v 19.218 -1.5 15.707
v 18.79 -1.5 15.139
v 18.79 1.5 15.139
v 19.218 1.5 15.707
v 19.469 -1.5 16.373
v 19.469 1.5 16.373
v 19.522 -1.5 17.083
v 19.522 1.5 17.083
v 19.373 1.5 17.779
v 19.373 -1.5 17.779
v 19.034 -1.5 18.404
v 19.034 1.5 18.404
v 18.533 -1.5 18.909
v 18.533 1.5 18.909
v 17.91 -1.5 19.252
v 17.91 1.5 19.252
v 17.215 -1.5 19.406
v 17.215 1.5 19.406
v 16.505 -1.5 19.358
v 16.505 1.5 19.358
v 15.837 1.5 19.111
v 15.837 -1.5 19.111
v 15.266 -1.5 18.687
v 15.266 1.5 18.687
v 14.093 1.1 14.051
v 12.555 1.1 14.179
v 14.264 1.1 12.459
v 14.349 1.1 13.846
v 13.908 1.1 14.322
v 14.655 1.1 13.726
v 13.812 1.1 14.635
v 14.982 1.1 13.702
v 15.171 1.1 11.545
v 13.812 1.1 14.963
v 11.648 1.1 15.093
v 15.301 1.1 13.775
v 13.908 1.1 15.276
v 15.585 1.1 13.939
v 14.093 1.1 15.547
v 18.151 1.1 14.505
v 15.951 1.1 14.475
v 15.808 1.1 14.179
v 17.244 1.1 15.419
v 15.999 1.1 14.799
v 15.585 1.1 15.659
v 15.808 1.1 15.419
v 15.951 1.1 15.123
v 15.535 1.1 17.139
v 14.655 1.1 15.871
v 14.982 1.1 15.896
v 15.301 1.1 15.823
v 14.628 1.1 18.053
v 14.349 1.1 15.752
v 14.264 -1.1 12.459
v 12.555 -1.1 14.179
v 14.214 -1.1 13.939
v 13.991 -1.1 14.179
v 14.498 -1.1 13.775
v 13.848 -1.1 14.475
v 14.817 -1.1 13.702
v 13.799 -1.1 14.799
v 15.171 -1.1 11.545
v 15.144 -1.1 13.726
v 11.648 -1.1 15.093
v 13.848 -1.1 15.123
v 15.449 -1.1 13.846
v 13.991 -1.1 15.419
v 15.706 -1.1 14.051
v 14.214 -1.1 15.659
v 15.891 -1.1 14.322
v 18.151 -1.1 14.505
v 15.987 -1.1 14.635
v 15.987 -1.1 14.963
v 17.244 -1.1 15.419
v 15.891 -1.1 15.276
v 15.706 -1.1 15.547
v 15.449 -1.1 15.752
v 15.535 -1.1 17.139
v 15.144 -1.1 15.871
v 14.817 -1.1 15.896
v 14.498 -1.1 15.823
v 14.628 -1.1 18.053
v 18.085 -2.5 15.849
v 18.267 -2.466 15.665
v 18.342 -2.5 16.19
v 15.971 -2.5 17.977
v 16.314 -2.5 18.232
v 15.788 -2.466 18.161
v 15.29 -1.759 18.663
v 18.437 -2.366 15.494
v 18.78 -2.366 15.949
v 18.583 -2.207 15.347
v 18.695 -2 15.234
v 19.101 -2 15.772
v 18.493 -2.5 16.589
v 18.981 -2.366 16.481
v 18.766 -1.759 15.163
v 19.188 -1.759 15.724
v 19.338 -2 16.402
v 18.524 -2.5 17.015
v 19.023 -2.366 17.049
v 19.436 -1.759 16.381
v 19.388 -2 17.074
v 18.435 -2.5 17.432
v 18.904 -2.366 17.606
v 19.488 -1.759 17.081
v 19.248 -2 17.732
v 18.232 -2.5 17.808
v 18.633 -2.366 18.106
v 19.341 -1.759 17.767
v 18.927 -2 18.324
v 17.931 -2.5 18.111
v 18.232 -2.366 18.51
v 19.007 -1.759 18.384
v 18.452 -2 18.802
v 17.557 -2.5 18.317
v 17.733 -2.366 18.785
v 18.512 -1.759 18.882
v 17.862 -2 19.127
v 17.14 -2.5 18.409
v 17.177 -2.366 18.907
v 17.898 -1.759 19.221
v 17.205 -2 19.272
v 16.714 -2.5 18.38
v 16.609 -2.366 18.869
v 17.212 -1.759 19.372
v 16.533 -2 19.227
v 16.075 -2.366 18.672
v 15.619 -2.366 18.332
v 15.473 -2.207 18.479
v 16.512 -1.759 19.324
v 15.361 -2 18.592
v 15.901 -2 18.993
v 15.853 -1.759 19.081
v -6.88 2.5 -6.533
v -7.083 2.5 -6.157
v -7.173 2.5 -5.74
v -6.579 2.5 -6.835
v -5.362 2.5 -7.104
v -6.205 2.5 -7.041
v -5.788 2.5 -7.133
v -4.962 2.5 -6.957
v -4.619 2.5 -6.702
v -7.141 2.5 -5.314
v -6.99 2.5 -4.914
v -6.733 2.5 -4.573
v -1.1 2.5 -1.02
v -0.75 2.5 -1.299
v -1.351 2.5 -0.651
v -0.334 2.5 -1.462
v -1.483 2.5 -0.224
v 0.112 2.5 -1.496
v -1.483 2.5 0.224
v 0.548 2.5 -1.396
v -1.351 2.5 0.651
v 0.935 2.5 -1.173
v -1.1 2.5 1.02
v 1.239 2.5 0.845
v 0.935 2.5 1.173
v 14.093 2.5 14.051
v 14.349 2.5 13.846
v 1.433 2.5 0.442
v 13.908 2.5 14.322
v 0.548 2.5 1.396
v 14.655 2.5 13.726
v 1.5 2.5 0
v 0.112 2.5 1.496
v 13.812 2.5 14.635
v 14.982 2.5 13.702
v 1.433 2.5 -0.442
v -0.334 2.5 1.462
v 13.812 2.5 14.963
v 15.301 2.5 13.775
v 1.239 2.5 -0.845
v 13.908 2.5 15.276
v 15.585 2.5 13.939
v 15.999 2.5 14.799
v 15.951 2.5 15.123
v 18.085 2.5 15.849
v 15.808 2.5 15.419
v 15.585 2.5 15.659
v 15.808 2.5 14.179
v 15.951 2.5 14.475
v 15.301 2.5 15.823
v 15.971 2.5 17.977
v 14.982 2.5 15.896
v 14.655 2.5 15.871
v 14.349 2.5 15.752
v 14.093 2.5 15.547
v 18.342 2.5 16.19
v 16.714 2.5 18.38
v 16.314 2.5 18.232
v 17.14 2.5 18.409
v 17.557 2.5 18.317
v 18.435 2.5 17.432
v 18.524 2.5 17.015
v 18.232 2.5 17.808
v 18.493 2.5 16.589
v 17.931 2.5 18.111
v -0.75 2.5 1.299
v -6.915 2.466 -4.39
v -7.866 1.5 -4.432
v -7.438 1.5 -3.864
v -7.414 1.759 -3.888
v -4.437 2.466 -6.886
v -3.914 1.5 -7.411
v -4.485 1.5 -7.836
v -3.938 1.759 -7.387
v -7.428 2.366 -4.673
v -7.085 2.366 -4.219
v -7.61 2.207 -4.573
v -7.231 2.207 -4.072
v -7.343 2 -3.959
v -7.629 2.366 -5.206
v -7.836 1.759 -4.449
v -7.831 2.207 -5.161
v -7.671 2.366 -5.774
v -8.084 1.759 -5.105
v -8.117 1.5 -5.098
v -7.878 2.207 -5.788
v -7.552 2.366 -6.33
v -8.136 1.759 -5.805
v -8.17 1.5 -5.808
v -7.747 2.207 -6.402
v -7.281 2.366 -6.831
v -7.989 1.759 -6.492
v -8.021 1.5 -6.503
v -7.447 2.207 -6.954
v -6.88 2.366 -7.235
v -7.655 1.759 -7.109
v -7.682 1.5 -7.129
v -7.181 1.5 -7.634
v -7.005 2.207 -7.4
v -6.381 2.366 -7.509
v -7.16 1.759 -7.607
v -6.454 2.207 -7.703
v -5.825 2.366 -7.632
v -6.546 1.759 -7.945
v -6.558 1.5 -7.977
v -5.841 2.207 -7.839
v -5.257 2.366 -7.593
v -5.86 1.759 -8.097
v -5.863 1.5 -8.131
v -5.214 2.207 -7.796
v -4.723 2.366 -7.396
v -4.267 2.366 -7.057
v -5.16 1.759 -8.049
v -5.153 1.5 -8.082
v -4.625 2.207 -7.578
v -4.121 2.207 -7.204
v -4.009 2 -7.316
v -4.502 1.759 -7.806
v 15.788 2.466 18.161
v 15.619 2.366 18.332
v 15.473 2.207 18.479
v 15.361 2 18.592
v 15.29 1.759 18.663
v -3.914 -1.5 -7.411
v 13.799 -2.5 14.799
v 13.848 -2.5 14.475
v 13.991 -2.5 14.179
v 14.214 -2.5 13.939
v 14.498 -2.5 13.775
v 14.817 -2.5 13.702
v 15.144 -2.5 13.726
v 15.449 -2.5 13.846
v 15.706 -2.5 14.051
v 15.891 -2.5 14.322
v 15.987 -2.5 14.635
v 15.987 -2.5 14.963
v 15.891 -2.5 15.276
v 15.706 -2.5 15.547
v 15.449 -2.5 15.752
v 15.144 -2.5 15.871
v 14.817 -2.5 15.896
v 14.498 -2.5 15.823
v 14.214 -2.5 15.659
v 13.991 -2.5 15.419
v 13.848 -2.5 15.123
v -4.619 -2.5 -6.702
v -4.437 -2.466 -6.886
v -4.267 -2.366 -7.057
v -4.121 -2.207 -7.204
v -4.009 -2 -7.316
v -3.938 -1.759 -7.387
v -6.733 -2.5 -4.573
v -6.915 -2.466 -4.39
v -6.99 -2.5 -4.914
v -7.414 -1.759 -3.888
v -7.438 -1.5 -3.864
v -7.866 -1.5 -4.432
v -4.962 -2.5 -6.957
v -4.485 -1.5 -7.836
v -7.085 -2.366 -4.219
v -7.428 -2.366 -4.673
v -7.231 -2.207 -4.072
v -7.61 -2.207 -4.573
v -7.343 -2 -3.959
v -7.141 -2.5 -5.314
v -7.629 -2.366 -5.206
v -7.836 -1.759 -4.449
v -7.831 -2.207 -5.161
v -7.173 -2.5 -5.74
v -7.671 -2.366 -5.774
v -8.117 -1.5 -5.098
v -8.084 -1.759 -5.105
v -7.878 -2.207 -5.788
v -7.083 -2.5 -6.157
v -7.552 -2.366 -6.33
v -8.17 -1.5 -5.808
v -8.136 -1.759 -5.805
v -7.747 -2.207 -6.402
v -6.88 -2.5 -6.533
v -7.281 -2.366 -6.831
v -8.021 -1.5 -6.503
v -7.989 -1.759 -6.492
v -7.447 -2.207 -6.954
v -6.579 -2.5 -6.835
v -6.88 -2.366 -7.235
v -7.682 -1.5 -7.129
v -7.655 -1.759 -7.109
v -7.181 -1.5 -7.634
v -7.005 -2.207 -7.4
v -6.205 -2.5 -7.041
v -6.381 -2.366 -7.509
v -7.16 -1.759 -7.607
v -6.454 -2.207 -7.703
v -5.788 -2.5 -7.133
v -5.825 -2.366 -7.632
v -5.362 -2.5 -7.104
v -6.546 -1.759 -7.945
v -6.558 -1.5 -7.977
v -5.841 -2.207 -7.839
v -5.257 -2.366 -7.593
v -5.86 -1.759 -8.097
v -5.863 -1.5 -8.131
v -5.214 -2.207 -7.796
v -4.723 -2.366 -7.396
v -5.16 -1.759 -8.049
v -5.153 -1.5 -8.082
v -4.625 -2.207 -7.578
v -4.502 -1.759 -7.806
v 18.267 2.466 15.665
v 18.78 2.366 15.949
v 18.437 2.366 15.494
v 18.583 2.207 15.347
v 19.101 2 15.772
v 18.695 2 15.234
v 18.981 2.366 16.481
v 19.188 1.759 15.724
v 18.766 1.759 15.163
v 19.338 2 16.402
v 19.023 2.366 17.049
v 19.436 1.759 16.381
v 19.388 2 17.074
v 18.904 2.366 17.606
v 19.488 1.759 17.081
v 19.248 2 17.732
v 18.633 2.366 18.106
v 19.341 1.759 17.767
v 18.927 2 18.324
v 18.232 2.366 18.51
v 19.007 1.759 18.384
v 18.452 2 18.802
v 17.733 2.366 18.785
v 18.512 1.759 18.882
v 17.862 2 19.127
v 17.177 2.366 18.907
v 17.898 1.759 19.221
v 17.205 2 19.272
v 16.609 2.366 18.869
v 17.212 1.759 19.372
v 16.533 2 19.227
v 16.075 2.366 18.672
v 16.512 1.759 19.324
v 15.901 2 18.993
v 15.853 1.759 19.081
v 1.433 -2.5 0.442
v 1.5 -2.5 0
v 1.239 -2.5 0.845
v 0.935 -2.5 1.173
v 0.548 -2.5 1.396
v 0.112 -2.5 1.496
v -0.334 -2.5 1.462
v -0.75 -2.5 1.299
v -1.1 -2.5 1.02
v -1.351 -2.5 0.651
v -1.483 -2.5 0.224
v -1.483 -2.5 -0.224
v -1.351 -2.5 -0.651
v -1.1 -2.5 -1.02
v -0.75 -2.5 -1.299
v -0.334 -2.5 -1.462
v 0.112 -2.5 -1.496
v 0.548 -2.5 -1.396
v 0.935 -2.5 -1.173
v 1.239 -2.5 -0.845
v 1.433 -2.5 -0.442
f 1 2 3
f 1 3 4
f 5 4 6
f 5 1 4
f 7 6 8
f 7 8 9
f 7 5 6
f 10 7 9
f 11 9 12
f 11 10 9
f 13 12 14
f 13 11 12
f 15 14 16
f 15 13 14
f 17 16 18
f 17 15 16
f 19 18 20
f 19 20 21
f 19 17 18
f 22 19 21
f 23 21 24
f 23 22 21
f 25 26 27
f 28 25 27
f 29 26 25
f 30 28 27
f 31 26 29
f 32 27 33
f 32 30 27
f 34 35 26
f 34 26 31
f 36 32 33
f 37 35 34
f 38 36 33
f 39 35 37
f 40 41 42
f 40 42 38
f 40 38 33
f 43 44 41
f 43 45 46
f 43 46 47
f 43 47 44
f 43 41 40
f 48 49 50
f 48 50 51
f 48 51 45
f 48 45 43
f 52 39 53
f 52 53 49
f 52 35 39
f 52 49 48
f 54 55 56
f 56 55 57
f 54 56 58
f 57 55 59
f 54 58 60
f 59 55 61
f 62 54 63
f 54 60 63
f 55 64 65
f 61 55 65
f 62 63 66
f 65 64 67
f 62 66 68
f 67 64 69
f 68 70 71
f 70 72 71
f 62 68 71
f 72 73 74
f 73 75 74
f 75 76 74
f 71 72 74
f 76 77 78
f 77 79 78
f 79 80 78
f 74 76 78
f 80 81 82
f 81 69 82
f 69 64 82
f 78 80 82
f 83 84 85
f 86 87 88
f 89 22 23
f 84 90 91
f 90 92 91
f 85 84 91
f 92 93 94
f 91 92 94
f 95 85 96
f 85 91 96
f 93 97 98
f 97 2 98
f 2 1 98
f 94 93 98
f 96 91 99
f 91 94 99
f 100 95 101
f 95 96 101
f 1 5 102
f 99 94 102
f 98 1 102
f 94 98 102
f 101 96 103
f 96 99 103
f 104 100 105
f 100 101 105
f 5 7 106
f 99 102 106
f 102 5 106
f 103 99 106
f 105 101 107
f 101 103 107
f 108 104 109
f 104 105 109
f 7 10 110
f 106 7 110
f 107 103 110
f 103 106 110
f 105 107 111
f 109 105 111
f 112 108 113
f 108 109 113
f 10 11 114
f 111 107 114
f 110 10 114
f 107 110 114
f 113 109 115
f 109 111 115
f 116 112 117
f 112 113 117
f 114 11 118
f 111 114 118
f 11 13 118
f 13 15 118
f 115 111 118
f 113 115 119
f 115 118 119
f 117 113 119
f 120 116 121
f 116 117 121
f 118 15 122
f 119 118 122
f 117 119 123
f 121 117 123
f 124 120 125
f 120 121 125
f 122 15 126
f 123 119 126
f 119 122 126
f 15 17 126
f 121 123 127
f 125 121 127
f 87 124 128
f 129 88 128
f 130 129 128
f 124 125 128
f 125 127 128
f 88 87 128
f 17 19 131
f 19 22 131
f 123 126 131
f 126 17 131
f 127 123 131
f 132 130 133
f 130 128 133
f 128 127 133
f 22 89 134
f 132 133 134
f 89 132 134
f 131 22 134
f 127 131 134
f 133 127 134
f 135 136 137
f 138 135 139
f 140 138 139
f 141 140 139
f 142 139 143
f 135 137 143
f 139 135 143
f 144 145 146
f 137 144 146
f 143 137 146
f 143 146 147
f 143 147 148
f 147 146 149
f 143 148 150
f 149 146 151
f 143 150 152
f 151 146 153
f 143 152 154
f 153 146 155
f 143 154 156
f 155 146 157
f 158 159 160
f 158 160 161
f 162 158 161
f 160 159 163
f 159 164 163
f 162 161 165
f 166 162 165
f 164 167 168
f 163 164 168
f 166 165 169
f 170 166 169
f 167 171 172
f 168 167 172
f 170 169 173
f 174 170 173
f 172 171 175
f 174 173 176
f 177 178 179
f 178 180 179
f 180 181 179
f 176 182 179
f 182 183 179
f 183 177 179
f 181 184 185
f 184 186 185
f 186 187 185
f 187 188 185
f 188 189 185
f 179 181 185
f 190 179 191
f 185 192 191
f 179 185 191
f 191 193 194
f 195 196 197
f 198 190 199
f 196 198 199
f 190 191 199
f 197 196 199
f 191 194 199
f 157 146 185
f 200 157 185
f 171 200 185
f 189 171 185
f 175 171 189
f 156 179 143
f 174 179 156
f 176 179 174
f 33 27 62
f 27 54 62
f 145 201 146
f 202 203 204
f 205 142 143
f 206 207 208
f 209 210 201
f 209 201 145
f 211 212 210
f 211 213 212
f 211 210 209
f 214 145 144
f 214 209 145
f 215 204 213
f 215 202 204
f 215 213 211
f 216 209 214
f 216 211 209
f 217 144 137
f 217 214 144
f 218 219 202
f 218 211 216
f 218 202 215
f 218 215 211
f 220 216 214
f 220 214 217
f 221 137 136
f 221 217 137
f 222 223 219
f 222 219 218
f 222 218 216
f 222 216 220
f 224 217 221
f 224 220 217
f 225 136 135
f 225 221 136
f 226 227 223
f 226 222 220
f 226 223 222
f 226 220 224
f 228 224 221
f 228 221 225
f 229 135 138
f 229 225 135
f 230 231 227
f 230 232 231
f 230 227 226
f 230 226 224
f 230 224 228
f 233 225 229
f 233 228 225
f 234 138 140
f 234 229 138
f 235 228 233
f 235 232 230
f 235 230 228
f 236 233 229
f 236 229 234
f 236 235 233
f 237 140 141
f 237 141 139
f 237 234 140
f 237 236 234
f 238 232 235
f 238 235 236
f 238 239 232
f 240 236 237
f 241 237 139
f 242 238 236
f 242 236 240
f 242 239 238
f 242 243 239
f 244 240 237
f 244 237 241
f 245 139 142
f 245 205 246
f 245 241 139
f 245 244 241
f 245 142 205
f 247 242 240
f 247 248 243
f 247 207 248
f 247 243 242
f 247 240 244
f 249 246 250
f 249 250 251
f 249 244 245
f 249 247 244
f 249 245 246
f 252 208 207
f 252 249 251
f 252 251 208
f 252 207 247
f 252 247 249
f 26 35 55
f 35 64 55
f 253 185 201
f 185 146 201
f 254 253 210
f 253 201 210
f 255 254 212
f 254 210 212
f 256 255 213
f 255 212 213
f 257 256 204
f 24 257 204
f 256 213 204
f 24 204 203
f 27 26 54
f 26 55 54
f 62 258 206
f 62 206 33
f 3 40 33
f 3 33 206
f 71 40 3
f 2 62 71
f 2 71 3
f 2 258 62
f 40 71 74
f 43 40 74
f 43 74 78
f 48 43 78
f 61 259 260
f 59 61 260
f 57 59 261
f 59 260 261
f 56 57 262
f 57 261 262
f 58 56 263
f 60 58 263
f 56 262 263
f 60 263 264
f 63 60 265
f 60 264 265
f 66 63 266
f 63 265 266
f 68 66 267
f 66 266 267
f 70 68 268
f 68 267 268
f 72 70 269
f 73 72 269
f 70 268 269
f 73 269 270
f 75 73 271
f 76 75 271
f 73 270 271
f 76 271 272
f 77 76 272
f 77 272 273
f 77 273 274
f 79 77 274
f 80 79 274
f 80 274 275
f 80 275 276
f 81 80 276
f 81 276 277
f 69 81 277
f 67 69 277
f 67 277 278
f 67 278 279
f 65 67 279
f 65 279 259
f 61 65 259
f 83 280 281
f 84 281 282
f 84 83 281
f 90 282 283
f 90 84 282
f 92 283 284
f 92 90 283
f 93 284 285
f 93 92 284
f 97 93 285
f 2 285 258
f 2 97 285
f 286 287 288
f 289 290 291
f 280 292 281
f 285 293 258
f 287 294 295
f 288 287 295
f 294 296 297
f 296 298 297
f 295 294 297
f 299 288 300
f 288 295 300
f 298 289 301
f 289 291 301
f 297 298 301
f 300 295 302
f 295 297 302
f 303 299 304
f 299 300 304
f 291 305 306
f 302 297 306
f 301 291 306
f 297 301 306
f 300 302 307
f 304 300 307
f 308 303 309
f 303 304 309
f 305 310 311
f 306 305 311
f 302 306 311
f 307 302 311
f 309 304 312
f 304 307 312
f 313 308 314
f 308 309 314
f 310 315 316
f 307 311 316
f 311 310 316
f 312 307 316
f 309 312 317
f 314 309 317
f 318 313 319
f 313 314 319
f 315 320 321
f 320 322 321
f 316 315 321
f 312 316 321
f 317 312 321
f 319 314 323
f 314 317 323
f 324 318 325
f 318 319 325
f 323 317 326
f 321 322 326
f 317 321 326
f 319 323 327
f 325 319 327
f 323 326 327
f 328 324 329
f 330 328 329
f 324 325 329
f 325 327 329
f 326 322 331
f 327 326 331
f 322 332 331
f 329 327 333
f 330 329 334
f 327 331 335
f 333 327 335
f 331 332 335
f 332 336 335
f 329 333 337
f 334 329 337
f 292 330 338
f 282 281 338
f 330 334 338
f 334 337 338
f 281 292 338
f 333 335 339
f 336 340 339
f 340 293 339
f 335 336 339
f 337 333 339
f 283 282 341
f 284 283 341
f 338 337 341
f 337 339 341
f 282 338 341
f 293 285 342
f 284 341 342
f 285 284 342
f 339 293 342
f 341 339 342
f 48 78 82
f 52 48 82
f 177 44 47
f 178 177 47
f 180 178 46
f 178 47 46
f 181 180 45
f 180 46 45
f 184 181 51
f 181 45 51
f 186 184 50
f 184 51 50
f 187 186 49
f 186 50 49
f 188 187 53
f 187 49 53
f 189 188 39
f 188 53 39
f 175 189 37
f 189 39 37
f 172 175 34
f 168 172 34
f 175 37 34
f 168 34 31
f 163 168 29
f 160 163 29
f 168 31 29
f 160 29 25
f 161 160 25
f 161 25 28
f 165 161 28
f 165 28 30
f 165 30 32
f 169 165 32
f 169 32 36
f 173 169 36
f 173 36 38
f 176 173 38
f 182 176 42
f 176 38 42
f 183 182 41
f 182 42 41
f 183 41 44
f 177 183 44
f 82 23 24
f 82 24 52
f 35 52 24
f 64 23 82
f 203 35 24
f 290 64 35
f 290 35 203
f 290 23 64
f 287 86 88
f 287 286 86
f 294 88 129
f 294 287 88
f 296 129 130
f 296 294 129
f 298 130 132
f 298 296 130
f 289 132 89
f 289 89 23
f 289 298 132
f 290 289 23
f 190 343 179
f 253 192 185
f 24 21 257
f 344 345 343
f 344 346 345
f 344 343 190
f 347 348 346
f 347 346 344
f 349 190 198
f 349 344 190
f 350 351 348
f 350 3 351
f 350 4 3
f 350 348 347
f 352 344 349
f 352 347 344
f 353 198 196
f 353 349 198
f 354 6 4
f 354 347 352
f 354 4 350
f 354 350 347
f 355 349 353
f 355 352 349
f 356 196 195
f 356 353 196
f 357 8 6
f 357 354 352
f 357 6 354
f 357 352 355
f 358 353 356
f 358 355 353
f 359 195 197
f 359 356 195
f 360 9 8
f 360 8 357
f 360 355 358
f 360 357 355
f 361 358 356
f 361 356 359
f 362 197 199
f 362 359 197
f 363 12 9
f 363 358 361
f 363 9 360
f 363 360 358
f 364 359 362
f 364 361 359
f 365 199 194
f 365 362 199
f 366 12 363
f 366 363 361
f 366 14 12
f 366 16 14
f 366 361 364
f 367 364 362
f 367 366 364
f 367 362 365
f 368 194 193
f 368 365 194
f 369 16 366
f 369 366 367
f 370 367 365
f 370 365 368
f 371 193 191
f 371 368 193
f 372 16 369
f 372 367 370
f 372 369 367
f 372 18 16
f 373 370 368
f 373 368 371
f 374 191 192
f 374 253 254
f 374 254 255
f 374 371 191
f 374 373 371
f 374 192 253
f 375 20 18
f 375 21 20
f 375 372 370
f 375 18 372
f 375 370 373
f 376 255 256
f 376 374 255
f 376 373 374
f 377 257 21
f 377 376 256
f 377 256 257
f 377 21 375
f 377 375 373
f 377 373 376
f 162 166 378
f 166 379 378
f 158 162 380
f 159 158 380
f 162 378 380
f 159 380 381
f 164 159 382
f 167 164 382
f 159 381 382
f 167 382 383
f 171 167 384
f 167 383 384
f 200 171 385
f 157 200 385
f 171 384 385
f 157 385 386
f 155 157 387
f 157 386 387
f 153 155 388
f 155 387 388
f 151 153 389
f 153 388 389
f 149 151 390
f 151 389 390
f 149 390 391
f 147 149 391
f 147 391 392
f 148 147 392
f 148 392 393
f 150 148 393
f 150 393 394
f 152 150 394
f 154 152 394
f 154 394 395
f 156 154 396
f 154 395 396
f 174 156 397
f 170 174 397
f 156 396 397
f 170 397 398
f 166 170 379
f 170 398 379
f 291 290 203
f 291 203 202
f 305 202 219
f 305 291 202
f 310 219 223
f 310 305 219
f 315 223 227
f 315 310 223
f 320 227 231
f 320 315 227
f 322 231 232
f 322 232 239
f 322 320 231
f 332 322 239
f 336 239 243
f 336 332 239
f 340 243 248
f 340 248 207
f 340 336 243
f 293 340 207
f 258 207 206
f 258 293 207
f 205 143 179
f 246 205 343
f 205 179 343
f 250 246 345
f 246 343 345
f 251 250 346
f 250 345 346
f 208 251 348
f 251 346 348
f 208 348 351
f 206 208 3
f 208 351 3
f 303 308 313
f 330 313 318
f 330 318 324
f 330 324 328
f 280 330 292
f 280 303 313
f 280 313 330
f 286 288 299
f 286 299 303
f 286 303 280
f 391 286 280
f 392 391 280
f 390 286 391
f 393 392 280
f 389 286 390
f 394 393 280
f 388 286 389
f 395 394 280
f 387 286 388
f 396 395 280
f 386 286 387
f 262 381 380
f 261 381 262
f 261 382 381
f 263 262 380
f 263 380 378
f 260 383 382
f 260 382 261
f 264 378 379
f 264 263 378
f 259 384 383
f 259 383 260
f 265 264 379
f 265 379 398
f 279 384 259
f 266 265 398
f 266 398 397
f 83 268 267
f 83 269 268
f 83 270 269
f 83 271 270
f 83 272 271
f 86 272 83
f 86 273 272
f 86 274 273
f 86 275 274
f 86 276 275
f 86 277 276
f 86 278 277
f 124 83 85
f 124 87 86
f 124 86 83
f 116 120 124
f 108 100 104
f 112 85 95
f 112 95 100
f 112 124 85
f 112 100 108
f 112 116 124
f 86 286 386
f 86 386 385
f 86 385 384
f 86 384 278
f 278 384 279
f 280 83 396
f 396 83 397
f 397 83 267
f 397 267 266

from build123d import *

# Parameters (mm, degrees)
F0_R     = 1.5
F1_DEPTH = 2.5
F2_DEPTH = 5
F3_R     = 0.99999
F6_DEPTH = 1.1
F7_D     = 2.2
F7_DEPTH = 2.501
F8_D     = 2.2


# Not quite as in the source:
# - a fillet or chamfer is up to 0.001 mm smaller than in the source, because OpenCascade refuses the exact size


with BuildPart() as f1:
    # F0 (on Front) → F1 (new body, symmetric)
    with BuildSketch(Plane.XZ):
        with BuildLine():
            ThreePointArc((-7.4377474476, -3.8639245472), (-7.4497190923, -7.3994381845), (-3.9142054549, -7.4114098292))
            Line((-3.9142054549, -7.4114098292), (18.78970035, 15.1392589236))
            ThreePointArc((18.78970035, 15.1392589236), (18.8016719947, 18.6747725609), (15.2661583574, 18.6867442056))
            Line((15.2661583574, 18.6867442056), (-7.4377474476, -3.8639245472))
        make_face()
        Circle(F0_R, mode=Mode.SUBTRACT)
        Circle(F0_R)
    extrude(amount=F1_DEPTH, both=True)

    # F0 (on Front) → F2 (cut, symmetric)
    with BuildSketch(Plane.XZ):
        Circle(F0_R)
    extrude(amount=F2_DEPTH, both=True, mode=Mode.SUBTRACT)

    # F3 (radius 1 in the source; OpenCascade refuses exactly that, so slightly less here)
    f3_edges = [f1.edges().sort_by_distance(p)[0] for p in [
        (3.914205, -2.5, 7.41141),
        (3.914205, 2.5, 7.41141),
    ]]
    fillet(f3_edges, radius=F3_R)

    # F5 (on Front) → F6 (cut, symmetric)
    with BuildSketch(Plane.XZ):
        Polygon((17.2437955285, 15.4185445413), (16.6082652356, 13.0784374397), (14.2639078916, 12.4587692675), (15.1712653624, 11.5452460911), (18.1511529993, 14.5050213649), align=None)
        Polygon((14.2639078916, 12.4587692675), (16.6082652356, 13.0784374397), (17.2437955285, 15.4185445413), (15.5349684774, 17.1389834706), (13.1906111334, 16.5193152984), (12.5550808405, 14.1792081968), align=None)
        Polygon((11.6477233698, 15.0927313731), (12.5550808405, 14.1792081968), (13.1906111334, 16.5193152984), (15.5349684774, 17.1389834706), (14.6276110067, 18.0525066469), align=None)
    extrude(amount=F6_DEPTH, both=True, mode=Mode.SUBTRACT)

    # F7 (through all, one way)
    with BuildSketch(Plane.XZ):
        with Locations((14.8994381845, 14.798876369)):
            Circle(F7_D / 2)
    extrude(amount=-F7_DEPTH, mode=Mode.SUBTRACT)

    # F8 (through all)
    with Locations(Plane(origin=(0, 0, 0), x_dir=(1, 0, 0), z_dir=(0, 1, 0))):
        with Locations((14.8994381845, -14.798876369)):
            Hole(F8_D / 2)


solid = f1.part
